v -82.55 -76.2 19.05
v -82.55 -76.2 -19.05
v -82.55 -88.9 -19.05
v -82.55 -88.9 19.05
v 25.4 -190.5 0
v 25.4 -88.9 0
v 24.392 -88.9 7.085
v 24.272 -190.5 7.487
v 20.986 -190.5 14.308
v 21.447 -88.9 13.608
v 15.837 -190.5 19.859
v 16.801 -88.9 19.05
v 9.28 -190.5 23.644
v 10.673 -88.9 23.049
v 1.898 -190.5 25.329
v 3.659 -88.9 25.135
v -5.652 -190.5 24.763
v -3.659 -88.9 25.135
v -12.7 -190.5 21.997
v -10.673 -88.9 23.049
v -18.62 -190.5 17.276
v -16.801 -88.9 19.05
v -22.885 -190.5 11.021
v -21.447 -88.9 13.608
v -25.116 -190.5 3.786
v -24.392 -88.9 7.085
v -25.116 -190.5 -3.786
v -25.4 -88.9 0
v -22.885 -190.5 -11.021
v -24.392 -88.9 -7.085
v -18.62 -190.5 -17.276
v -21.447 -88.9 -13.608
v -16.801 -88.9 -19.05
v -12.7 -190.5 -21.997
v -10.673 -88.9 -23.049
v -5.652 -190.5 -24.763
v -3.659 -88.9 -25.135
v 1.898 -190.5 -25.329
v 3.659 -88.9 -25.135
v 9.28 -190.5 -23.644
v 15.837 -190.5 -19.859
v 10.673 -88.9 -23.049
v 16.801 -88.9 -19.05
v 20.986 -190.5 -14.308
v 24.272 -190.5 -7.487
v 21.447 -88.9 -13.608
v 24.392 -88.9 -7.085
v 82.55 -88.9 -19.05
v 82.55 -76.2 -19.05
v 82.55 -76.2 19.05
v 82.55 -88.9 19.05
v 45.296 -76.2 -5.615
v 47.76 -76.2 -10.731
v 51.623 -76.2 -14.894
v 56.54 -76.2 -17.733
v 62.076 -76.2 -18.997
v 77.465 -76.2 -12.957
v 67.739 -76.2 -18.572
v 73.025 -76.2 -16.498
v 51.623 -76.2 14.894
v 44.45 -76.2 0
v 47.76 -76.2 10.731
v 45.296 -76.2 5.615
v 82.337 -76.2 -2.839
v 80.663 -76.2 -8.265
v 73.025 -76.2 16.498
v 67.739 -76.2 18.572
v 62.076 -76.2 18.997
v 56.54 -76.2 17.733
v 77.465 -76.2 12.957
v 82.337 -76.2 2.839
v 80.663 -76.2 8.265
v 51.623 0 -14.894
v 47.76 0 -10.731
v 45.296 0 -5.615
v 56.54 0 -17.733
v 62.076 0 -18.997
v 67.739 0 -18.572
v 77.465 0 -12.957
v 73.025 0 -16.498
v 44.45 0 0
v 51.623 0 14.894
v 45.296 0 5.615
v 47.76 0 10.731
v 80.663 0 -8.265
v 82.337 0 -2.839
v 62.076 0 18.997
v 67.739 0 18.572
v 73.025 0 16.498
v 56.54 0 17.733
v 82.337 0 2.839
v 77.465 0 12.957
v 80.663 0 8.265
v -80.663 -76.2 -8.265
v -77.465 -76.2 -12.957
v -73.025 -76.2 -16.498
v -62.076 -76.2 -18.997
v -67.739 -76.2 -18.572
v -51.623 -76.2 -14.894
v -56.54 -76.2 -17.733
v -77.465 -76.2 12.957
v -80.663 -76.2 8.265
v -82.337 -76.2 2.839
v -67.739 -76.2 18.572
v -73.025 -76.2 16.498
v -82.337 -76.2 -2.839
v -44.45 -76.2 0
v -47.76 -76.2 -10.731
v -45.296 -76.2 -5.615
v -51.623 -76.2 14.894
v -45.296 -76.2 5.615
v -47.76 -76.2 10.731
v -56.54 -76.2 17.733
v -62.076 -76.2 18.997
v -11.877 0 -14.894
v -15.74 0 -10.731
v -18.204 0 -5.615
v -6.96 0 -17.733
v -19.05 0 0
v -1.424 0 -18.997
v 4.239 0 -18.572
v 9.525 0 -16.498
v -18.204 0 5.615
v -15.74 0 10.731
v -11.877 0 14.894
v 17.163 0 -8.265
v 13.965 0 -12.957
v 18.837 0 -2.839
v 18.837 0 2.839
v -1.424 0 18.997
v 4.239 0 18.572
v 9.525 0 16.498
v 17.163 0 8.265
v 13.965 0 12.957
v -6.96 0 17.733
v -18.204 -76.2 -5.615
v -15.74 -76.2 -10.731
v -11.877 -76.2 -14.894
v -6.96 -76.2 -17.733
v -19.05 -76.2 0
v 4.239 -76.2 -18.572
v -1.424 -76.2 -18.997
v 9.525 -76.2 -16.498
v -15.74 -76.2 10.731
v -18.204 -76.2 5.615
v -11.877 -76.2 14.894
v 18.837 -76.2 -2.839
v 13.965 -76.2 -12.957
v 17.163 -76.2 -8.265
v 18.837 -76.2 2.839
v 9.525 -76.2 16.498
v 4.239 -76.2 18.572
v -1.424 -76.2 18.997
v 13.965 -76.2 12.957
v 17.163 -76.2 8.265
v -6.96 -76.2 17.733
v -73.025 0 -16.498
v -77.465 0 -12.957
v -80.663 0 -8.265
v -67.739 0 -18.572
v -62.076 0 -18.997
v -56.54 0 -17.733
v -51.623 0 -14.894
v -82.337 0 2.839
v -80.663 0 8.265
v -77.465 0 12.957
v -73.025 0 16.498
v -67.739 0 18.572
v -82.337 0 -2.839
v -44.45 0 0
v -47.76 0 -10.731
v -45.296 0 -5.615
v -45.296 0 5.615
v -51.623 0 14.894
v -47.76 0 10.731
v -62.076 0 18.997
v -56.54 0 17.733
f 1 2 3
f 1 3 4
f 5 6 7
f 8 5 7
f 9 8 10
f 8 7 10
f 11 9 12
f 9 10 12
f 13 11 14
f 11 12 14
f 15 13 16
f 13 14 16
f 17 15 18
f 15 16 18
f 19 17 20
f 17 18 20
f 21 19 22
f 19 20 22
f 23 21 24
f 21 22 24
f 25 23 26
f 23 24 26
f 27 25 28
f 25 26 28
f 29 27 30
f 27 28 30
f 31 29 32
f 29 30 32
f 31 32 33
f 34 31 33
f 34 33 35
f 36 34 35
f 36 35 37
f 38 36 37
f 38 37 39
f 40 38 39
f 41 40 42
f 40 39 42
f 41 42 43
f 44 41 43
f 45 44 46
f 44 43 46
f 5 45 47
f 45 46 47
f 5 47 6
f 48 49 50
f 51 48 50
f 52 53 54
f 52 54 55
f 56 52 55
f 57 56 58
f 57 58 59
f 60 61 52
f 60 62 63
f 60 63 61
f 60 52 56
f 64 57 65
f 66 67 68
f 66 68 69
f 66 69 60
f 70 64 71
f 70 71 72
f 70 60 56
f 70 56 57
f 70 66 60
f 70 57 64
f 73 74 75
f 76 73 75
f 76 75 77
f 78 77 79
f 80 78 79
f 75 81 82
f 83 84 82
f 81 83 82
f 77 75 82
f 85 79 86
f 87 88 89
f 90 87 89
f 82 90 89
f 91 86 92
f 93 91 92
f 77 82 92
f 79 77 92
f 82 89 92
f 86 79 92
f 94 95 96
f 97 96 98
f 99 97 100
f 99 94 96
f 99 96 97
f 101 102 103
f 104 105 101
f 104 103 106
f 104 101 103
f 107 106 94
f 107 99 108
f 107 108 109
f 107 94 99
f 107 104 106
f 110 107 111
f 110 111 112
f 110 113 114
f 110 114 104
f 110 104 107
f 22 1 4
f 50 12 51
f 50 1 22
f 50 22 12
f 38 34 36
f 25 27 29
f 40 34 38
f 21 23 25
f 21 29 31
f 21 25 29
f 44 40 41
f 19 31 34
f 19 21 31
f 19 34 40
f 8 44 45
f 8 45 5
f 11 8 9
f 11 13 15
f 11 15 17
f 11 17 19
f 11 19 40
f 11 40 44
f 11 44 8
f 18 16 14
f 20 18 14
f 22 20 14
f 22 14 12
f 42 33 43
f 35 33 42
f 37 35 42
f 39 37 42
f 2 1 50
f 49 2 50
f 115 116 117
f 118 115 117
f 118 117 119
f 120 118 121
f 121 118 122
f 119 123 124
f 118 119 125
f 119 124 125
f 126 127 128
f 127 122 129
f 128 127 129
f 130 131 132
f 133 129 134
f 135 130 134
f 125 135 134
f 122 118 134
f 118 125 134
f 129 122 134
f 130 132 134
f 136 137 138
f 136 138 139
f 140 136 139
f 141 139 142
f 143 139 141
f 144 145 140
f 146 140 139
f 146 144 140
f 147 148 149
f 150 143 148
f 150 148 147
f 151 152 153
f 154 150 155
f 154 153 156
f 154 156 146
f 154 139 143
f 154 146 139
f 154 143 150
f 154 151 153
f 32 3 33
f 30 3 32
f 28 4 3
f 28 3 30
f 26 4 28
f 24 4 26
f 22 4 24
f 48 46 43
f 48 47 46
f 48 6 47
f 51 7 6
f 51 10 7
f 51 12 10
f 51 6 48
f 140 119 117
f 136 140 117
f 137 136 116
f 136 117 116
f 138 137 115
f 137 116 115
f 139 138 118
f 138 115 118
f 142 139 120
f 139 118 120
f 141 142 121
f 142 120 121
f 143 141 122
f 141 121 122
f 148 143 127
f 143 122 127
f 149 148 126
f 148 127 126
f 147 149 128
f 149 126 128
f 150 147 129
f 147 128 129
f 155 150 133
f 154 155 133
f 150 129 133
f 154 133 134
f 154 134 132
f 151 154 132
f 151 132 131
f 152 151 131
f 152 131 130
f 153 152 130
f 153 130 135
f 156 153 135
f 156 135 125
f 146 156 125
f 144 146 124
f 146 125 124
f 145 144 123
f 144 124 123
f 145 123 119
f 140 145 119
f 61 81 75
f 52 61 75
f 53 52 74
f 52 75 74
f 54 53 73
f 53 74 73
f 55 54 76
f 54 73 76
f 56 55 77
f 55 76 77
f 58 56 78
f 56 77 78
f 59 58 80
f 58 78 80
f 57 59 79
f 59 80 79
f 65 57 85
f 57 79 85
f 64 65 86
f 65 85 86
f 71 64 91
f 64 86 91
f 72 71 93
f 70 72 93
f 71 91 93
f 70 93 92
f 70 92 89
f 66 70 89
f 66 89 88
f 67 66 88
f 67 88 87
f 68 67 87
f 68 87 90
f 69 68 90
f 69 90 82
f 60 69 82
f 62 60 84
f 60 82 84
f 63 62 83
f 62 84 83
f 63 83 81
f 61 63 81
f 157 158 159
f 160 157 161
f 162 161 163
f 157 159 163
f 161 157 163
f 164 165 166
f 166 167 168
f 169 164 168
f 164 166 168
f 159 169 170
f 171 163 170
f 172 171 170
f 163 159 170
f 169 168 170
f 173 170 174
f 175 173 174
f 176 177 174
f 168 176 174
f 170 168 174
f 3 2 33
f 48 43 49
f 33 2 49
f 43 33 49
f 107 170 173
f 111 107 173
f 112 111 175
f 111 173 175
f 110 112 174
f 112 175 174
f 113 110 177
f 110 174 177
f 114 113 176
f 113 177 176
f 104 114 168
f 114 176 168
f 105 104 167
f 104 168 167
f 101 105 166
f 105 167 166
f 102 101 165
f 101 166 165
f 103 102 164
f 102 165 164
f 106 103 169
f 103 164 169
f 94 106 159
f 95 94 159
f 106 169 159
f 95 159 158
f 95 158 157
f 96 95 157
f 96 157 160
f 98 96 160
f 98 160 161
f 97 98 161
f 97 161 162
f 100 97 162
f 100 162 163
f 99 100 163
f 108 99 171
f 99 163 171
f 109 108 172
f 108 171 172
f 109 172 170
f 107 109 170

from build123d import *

# Parameters (mm, degrees)
F0_R     = 19.05
F1_DEPTH = 76.2
F2_W     = 165.1
F2_H     = 38.1
F3_DEPTH = 12.7
F4_R     = 25.4
F5_DEPTH = 101.6


with BuildPart() as f1:
    # F0 (on Front) → F1 (new body)
    with BuildSketch(Plane.XZ):
        with BuildLine():
            Line((0, 0), (19.05, 0))
            ThreePointArc((19.05, 0), (0, 19.05), (-19.05, 0))
            Line((-19.05, 0), (0, 0))
        make_face()
        with Locations((-63.5, 0)):
            Circle(F0_R)
        with BuildLine():
            ThreePointArc((-19.05, 0), (0, -19.05), (19.05, 0))
            Line((19.05, 0), (0, 0))
            Line((0, 0), (-19.05, 0))
        make_face()
        with BuildLine():
            ThreePointArc((82.55, 0), (63.5, 19.05), (44.45, 0))
            ThreePointArc((44.45, 0), (63.5, -19.05), (82.55, 0))
        make_face()
    extrude(amount=F1_DEPTH)


with BuildPart() as f3:
    # F2 (on face) → F3 (new body)
    with BuildSketch(Plane.XZ.offset(76.2)):
        Rectangle(F2_W, F2_H)
    extrude(amount=F3_DEPTH)

    # F4 (on face) → F5 (join)
    with BuildSketch(Plane.XZ.offset(88.9)):
        Circle(F4_R)
    extrude(amount=F5_DEPTH)


solid = Compound([f1.part, f3.part])
